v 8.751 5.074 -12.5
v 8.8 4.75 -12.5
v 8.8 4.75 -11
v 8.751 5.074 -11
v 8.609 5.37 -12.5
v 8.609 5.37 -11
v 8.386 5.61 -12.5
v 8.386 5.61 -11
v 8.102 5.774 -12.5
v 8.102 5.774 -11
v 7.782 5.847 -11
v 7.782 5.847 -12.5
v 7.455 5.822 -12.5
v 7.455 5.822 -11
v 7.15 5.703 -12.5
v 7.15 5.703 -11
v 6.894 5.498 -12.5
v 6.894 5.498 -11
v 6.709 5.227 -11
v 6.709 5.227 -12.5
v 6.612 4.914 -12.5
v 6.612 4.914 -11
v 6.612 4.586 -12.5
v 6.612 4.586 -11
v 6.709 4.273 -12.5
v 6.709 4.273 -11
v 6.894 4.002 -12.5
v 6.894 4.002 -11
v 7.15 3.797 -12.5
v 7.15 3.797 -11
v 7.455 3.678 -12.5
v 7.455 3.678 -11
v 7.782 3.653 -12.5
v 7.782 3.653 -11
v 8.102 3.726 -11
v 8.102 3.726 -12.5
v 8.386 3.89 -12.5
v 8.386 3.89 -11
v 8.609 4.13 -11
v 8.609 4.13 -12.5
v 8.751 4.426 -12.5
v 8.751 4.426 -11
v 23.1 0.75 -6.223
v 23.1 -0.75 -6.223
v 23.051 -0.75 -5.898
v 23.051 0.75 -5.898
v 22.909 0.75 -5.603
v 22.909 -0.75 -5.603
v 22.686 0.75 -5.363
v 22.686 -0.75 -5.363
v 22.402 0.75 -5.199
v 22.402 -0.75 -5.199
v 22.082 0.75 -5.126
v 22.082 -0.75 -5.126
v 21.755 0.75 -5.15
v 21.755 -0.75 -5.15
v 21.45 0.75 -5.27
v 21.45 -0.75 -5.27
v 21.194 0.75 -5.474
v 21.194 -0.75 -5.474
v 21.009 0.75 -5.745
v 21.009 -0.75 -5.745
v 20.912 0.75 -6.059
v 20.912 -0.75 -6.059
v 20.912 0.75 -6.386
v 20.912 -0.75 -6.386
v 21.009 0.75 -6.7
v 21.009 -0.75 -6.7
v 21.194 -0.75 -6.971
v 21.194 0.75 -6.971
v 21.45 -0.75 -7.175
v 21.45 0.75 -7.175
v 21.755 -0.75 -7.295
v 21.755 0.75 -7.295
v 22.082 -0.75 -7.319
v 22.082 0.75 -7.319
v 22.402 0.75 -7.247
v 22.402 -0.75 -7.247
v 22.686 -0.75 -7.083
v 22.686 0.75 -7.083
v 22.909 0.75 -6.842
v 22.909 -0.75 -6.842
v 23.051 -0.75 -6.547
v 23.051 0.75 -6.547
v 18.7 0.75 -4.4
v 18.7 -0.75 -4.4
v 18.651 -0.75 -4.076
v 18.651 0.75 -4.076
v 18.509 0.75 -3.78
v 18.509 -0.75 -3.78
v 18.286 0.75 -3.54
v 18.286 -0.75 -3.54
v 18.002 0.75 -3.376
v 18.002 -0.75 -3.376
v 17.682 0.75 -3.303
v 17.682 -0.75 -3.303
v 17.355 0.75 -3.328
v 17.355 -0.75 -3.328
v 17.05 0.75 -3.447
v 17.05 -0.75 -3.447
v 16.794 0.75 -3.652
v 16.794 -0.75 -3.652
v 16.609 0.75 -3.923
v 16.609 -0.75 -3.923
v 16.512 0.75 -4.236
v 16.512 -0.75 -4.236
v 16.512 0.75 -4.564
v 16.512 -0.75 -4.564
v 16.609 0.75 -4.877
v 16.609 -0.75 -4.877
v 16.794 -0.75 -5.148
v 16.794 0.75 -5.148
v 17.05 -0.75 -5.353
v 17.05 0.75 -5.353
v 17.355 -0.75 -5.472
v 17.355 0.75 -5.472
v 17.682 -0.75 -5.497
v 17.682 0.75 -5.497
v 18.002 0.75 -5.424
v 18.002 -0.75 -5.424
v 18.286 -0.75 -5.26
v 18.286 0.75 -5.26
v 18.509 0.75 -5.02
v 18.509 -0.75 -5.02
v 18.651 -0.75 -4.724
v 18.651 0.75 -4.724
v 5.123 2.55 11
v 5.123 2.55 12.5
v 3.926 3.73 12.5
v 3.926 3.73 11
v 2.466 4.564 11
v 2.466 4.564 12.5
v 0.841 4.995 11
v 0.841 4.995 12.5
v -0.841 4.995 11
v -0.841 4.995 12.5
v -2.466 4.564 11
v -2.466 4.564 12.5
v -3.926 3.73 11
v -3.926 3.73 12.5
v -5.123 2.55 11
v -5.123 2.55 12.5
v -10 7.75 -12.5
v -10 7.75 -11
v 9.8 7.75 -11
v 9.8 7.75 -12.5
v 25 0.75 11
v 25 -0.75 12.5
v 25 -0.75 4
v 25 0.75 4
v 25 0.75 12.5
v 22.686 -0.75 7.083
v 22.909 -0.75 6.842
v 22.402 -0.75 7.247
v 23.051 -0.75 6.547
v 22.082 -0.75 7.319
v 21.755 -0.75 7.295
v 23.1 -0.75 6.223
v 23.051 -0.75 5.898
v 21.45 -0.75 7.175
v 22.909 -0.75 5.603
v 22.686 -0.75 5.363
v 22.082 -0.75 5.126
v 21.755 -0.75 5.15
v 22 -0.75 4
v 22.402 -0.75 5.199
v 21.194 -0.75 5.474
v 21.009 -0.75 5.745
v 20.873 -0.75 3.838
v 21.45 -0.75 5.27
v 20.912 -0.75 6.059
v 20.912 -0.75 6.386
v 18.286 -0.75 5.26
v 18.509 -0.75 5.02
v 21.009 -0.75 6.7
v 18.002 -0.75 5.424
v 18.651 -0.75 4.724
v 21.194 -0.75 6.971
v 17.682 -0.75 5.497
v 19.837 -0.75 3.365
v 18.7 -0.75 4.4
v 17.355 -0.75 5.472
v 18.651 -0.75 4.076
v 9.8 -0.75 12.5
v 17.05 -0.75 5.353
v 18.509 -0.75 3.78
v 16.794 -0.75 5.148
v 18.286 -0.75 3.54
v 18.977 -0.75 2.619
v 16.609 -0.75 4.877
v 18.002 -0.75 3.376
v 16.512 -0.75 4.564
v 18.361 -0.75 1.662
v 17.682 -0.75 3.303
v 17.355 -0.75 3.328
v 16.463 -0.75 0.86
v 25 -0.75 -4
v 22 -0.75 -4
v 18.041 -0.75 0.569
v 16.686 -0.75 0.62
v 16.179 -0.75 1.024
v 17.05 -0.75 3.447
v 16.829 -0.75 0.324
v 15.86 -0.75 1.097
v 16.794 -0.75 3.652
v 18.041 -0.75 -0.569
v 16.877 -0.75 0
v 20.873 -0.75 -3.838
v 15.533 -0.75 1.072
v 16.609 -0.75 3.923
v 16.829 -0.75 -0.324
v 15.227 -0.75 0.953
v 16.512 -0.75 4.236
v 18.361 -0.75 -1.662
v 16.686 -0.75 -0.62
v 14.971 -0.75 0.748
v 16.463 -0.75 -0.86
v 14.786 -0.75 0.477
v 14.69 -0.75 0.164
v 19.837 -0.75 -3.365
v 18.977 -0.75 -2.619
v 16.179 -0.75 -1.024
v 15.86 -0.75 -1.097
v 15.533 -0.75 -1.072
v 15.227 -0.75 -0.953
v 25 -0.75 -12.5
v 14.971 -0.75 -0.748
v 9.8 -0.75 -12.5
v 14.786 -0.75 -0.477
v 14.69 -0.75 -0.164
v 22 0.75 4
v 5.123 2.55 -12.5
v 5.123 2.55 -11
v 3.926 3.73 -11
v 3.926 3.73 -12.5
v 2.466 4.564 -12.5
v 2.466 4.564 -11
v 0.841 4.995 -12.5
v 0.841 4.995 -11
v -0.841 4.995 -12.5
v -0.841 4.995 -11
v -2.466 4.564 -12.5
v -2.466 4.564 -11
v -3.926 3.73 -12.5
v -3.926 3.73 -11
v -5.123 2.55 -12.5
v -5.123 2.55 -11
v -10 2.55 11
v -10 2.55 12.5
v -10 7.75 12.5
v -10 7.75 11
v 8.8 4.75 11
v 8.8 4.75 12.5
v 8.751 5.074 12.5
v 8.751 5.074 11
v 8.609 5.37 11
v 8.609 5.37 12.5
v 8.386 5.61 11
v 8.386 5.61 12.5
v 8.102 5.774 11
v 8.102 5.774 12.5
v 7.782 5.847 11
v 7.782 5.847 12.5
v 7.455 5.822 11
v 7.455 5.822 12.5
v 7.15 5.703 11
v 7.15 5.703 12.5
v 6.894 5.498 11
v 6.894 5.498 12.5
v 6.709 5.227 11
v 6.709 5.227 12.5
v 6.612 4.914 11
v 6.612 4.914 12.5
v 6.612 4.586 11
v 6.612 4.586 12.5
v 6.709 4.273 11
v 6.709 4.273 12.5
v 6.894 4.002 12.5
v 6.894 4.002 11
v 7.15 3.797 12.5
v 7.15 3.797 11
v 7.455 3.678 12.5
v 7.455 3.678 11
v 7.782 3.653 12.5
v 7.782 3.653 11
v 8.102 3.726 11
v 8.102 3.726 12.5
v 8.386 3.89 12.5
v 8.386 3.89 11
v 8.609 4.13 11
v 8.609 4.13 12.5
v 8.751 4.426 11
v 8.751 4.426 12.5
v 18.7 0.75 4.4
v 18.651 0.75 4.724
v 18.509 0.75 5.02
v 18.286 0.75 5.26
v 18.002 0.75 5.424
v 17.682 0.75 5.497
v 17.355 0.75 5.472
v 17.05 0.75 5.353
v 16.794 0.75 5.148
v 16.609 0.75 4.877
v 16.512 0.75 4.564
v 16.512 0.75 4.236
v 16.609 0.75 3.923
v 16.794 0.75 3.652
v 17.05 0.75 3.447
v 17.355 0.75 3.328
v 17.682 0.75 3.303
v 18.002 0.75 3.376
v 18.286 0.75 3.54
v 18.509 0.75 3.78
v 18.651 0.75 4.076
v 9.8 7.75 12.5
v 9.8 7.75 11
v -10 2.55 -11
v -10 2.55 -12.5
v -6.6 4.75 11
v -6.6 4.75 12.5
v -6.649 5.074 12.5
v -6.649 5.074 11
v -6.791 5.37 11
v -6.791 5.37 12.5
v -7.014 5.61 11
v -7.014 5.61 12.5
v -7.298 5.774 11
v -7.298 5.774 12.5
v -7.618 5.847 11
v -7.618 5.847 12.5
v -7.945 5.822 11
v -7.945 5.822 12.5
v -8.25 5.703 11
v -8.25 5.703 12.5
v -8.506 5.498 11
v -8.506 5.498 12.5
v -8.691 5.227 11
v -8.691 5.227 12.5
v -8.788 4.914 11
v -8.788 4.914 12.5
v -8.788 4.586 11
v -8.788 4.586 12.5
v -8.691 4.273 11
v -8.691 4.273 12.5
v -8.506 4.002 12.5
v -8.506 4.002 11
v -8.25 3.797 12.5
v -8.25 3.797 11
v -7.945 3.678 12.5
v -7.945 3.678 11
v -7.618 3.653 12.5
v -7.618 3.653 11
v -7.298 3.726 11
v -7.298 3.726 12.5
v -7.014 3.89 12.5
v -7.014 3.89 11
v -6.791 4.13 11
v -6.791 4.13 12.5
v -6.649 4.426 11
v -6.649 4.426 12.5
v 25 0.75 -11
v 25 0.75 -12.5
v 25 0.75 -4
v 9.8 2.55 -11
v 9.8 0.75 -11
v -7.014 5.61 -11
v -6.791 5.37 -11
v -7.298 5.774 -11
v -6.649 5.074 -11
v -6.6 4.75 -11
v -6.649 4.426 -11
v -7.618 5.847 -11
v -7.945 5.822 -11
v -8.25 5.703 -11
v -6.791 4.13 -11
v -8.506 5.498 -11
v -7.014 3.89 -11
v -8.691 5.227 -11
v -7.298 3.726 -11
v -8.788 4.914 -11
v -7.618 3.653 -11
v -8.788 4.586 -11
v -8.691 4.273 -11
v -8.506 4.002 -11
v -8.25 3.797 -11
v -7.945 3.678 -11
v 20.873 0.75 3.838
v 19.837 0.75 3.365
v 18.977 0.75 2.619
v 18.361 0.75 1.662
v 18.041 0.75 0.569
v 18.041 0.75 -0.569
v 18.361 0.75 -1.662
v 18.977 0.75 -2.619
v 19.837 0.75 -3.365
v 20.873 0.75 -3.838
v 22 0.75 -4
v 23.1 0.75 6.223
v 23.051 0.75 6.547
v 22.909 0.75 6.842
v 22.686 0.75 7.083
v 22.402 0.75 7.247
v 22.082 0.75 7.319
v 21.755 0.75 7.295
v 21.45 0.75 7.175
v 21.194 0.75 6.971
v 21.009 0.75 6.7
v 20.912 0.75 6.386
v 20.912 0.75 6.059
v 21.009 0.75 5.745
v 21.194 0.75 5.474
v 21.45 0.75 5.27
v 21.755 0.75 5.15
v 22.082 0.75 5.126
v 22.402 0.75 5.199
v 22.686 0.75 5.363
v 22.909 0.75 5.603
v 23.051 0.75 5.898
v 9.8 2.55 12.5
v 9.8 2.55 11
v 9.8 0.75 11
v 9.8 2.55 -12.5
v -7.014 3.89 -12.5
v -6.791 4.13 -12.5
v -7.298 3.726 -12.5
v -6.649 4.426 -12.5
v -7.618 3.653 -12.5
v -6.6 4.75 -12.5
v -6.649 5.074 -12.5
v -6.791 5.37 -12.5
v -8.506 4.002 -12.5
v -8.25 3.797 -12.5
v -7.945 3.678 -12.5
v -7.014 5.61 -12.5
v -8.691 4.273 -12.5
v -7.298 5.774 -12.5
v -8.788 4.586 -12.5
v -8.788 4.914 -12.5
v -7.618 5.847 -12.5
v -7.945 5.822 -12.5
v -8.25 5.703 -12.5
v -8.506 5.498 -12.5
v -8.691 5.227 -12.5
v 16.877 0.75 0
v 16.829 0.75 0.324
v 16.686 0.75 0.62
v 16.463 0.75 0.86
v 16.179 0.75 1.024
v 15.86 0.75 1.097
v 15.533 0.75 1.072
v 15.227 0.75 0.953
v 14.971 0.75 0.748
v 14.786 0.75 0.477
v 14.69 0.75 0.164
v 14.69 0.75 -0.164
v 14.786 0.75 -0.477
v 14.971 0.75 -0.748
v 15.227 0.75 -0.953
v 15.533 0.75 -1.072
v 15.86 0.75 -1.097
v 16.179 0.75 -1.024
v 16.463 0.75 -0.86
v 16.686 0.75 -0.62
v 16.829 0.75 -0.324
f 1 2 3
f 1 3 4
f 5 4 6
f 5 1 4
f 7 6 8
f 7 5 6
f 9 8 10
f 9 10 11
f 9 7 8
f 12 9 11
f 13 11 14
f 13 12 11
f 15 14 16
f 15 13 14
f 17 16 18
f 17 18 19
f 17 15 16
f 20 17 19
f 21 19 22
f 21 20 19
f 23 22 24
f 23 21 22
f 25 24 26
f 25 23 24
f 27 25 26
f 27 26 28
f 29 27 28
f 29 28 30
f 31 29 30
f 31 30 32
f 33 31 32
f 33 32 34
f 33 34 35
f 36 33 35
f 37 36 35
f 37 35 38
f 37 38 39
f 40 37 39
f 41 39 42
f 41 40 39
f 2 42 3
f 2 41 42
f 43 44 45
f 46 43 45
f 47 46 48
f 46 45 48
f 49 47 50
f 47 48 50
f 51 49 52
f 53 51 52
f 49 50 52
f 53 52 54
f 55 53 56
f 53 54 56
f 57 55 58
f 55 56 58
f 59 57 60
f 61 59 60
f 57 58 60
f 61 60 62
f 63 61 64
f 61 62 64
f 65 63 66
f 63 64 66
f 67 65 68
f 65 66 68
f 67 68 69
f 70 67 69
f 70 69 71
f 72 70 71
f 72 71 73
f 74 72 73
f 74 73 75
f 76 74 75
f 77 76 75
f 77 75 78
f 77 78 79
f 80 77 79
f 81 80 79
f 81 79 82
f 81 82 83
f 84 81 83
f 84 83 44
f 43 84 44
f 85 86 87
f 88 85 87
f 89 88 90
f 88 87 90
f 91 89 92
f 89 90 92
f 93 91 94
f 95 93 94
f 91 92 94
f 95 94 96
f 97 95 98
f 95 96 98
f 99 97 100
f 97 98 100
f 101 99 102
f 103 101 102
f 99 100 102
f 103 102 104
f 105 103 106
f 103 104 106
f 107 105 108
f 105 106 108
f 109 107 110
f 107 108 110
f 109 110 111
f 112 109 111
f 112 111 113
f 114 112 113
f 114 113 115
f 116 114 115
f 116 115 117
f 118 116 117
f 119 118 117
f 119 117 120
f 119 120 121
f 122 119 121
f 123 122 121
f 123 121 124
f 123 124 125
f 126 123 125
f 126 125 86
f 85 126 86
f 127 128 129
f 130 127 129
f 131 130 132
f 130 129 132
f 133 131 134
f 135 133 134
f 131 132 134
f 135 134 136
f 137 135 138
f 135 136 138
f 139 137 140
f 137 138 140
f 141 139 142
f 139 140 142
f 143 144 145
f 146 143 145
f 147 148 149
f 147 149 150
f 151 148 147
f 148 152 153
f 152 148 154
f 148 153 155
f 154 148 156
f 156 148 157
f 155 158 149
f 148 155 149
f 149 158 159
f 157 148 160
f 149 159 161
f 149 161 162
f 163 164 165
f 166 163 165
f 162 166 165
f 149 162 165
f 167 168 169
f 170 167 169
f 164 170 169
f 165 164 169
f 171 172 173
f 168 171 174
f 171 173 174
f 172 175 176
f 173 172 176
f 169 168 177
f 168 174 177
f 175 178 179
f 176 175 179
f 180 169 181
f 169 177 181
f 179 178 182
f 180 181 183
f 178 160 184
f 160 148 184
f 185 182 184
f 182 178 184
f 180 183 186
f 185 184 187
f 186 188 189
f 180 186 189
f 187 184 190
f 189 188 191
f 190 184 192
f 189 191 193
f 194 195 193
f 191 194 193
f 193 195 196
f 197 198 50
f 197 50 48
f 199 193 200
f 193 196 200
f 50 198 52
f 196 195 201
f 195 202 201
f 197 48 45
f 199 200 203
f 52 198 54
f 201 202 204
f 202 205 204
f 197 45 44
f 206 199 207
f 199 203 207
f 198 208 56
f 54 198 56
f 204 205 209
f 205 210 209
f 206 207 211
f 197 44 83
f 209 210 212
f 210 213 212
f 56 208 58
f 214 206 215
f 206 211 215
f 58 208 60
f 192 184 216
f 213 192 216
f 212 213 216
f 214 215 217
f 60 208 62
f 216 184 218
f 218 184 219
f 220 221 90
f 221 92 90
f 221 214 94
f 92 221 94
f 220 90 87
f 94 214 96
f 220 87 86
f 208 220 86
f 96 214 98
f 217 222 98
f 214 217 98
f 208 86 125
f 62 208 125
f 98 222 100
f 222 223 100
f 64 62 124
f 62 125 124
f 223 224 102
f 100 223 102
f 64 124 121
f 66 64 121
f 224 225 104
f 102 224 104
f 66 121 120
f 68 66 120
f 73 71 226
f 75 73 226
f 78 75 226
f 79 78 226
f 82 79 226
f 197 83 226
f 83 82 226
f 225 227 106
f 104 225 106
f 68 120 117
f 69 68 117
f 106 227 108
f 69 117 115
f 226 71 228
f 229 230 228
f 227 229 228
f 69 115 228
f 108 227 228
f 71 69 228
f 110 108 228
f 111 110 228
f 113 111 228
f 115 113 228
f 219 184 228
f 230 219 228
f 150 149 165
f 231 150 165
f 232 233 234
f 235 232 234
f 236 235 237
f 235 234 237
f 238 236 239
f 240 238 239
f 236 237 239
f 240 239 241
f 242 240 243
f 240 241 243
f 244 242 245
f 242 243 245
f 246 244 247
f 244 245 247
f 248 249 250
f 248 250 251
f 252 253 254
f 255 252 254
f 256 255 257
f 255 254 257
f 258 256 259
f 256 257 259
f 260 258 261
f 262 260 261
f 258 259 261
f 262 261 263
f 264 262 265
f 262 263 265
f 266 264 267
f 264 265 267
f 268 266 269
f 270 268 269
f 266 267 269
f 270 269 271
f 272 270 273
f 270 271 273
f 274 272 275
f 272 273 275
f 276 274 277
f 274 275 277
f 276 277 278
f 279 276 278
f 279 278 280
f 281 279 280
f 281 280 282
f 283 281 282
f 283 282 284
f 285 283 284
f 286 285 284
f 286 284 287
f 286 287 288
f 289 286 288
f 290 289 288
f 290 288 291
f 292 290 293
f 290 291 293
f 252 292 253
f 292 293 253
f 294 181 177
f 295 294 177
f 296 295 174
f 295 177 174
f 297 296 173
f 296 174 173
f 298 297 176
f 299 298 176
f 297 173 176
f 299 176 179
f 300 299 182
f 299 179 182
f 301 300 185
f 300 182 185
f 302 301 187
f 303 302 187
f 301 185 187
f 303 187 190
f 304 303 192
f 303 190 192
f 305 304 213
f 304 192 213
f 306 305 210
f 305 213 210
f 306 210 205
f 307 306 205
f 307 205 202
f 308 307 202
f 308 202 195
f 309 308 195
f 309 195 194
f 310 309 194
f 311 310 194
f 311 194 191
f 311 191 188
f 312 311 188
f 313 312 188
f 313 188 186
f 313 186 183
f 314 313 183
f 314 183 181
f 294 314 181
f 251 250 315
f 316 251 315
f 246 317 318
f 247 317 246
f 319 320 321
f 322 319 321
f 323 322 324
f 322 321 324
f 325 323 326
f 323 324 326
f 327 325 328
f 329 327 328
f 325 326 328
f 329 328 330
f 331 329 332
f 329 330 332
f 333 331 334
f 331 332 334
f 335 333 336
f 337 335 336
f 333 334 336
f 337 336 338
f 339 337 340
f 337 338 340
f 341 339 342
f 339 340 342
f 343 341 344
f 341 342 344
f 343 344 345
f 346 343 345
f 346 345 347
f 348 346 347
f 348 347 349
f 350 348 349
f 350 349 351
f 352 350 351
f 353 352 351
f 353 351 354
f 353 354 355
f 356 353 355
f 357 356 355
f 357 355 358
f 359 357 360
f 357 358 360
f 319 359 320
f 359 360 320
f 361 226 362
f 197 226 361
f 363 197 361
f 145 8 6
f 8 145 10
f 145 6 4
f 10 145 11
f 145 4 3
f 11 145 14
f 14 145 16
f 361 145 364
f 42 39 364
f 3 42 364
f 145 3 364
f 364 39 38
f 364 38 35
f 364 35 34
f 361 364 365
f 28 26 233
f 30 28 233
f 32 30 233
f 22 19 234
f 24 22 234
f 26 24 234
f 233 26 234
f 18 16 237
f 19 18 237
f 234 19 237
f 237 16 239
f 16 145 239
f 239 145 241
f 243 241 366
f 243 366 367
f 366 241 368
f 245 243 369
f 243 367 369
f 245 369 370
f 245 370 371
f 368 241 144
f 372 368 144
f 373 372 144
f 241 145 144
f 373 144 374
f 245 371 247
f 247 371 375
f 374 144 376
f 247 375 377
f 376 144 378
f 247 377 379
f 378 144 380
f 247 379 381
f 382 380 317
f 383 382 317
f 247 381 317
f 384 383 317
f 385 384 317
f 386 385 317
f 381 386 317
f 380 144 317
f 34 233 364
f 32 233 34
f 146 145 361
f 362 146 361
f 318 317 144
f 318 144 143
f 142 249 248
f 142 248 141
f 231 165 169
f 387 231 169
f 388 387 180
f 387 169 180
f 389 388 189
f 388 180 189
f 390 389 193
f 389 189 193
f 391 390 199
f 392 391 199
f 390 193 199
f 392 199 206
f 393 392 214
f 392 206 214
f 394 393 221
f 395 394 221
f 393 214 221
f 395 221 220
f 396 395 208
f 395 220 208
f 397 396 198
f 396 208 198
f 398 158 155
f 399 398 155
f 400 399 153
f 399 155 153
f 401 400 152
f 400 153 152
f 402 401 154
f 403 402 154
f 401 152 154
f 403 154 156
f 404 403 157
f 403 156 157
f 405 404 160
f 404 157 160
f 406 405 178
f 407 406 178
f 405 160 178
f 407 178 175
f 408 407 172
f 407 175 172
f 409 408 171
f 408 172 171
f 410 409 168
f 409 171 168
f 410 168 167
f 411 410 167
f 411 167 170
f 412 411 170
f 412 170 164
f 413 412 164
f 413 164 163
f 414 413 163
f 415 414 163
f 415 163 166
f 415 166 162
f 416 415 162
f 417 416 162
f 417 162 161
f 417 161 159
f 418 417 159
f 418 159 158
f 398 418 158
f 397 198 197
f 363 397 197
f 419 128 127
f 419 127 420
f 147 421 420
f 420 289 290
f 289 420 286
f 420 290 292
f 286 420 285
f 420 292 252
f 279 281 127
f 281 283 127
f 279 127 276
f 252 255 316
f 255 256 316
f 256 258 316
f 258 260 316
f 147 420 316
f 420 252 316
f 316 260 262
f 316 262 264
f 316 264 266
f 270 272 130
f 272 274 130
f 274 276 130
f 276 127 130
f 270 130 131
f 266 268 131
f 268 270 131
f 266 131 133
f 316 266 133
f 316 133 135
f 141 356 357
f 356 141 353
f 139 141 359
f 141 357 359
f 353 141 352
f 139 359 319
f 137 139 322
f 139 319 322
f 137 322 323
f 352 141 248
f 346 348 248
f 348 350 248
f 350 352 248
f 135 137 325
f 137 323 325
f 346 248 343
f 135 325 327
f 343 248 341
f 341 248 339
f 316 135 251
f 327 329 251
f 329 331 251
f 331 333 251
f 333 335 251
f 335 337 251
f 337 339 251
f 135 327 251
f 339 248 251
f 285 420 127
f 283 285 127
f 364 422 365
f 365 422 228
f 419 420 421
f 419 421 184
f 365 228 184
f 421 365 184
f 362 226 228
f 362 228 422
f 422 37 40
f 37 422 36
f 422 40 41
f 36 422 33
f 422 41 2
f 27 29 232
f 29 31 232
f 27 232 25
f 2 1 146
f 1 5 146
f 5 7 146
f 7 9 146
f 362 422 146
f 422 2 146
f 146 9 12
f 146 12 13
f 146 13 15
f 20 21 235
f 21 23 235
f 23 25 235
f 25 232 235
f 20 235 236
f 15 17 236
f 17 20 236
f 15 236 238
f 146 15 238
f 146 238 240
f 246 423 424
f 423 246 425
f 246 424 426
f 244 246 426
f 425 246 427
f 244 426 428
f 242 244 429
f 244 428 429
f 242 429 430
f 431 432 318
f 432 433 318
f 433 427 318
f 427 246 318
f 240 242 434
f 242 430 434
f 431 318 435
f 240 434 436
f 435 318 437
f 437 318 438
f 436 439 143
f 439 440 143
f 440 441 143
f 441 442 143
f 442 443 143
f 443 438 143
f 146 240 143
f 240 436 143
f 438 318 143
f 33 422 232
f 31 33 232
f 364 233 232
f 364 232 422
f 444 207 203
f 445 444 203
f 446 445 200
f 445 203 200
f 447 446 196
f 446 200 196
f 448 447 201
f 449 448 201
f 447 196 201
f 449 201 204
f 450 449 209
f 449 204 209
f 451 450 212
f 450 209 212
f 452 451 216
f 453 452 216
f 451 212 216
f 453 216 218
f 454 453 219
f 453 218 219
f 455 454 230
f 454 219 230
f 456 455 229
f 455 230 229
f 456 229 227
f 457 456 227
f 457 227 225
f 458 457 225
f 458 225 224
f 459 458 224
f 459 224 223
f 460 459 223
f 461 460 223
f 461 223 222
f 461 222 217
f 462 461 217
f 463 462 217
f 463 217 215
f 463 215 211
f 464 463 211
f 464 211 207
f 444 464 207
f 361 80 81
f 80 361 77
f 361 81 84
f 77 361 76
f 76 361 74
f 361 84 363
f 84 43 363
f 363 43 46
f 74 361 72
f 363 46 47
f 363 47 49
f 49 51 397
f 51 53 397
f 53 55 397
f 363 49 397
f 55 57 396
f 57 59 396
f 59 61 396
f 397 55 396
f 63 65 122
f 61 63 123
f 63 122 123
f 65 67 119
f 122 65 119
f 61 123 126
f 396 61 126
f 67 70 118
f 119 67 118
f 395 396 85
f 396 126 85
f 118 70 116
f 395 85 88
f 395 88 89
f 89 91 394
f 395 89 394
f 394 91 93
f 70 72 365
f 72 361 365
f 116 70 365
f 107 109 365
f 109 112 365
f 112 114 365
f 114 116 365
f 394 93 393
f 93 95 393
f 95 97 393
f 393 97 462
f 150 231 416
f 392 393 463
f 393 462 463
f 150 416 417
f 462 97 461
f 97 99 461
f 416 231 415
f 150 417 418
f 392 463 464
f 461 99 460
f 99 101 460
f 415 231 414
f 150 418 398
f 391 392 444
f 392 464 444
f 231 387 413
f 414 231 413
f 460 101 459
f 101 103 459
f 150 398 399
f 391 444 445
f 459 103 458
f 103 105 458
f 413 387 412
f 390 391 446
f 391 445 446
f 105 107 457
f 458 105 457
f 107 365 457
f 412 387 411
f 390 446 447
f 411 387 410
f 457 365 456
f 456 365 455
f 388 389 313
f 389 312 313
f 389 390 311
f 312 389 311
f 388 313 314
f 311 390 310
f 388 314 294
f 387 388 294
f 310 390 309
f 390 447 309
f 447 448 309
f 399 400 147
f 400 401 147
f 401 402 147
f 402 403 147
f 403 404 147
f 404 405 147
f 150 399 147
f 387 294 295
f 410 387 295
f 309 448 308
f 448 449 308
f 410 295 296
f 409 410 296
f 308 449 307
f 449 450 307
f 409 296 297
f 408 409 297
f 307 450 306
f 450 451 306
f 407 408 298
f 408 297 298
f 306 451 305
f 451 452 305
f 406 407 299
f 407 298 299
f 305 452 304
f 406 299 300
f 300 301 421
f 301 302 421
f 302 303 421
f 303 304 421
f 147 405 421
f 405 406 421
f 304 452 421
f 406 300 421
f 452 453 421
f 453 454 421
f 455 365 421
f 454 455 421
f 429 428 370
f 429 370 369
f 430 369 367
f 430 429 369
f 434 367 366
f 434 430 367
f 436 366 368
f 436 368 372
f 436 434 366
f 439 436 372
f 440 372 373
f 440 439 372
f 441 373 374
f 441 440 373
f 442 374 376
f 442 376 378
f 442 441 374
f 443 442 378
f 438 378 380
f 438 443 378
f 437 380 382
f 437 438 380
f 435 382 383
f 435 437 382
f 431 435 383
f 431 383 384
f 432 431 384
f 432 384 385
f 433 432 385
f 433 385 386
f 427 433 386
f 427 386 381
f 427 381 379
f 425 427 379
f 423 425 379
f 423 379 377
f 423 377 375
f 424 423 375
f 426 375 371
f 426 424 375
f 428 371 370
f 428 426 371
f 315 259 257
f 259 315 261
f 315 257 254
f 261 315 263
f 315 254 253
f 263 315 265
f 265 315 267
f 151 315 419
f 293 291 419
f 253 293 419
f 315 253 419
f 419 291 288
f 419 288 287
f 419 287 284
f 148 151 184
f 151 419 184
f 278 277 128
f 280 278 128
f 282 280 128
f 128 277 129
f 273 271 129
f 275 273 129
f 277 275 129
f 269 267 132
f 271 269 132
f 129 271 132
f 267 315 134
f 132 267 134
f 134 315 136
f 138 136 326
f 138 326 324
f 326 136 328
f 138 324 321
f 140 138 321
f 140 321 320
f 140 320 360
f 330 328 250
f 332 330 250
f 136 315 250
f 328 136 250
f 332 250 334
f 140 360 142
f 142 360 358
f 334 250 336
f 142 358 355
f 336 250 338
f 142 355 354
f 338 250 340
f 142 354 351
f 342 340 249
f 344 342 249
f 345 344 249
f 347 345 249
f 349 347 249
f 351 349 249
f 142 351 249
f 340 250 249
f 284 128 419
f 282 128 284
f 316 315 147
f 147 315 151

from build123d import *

# Parameters (mm, degrees)
F0_W      = 20
F0_H      = 1.5
F1_DEPTH  = 12.5
F2_W      = 20
F2_H      = 1.5
F3_DEPTH  = 8.5
F4_R      = 1.1
F5_DEPTH  = 1.5
F8_DEPTH  = 15
F9_R      = 1.1
F9_W      = 19.8
F9_H      = 25
F10_DEPTH = 3.3
F12_DEPTH = 25.001


with BuildPart() as f1:
    # F0 (on Top) → F1 (new body)
    with BuildSketch(Plane.XY):
        Rectangle(F0_W, F0_H)
    extrude(amount=F1_DEPTH)

    # F2 (on face) → F3 (join)
    with BuildSketch(Plane(origin=(0, 0.75, 0), x_dir=(-1, 0, 0), z_dir=(0, 1, 0))):
        with Locations((0, 11.75)):
            Rectangle(F2_W, F2_H)
    extrude(amount=F3_DEPTH)

    # F4 (on face) → F5 (cut, through all)
    with BuildSketch(Plane.XY.offset(12.5)):
        with Locations((-7.7, 4.75)):
            Circle(F4_R)
        with Locations((7.7, 4.75)):
            Circle(F4_R)
    extrude(amount=-F5_DEPTH, mode=Mode.SUBTRACT)

    # F6: F1 across plane


with BuildPart() as f1_1:
    add(f1.part)
    add(f1.part.mirror(Plane.XY))

    # F7 (on face) → F8 (join)
    with BuildSketch(Plane.YZ.offset(10)):
        Polygon((5.85, -12.5), (9.25, -12.5), (9.25, -11), (5.85, -11), (3.65, -11), (0.75, -11), (0.75, 11), (3.65, 11), (5.85, 11), (9.25, 11), (9.25, 12.5), (5.85, 12.5), (3.65, 12.5), (-0.75, 12.5), (-0.75, -12.5), (3.65, -12.5), align=None)
    extrude(amount=F8_DEPTH)

    # F9 (on face) → F10 (cut)
    with BuildSketch(Plane.XZ.offset(0.75)):
        with BuildLine():
            Line((25, 4), (22, 4))
            ThreePointArc((22, 4), (18, 0), (22, -4))
            Line((22, -4), (25, -4))
            Line((25, -4), (25, 4))
        make_face()
        with Locations((17.6, -4.4)):
            Circle(F9_R)
        with Locations((22, -6.2225396744)):
            Circle(F9_R)
        with Locations((22, 6.2225396744)):
            Circle(F9_R)
        with Locations((17.6, 4.4)):
            Circle(F9_R)
        with Locations((15.7774603256, 0)):
            Circle(F9_R)
        with Locations((-0.1, 0)):
            Rectangle(F9_W, F9_H)
    extrude(amount=-F10_DEPTH, mode=Mode.SUBTRACT)

    # F11 (on face) → F12 (cut, through all)
    with BuildSketch(Plane.XY.offset(12.5)):
        with BuildLine():
            Line((-5.123475383, 2.55), (5.123475383, 2.55))
            ThreePointArc((5.123475383, 2.55), (0, 5.05), (-5.123475383, 2.55))
        make_face()
        Polygon((-10, 9.25), (-10, 7.75), (9.8, 7.75), (25, 0.75), (25, 9.25), align=None)
    extrude(amount=-F12_DEPTH, mode=Mode.SUBTRACT)


solid = f1_1.part
